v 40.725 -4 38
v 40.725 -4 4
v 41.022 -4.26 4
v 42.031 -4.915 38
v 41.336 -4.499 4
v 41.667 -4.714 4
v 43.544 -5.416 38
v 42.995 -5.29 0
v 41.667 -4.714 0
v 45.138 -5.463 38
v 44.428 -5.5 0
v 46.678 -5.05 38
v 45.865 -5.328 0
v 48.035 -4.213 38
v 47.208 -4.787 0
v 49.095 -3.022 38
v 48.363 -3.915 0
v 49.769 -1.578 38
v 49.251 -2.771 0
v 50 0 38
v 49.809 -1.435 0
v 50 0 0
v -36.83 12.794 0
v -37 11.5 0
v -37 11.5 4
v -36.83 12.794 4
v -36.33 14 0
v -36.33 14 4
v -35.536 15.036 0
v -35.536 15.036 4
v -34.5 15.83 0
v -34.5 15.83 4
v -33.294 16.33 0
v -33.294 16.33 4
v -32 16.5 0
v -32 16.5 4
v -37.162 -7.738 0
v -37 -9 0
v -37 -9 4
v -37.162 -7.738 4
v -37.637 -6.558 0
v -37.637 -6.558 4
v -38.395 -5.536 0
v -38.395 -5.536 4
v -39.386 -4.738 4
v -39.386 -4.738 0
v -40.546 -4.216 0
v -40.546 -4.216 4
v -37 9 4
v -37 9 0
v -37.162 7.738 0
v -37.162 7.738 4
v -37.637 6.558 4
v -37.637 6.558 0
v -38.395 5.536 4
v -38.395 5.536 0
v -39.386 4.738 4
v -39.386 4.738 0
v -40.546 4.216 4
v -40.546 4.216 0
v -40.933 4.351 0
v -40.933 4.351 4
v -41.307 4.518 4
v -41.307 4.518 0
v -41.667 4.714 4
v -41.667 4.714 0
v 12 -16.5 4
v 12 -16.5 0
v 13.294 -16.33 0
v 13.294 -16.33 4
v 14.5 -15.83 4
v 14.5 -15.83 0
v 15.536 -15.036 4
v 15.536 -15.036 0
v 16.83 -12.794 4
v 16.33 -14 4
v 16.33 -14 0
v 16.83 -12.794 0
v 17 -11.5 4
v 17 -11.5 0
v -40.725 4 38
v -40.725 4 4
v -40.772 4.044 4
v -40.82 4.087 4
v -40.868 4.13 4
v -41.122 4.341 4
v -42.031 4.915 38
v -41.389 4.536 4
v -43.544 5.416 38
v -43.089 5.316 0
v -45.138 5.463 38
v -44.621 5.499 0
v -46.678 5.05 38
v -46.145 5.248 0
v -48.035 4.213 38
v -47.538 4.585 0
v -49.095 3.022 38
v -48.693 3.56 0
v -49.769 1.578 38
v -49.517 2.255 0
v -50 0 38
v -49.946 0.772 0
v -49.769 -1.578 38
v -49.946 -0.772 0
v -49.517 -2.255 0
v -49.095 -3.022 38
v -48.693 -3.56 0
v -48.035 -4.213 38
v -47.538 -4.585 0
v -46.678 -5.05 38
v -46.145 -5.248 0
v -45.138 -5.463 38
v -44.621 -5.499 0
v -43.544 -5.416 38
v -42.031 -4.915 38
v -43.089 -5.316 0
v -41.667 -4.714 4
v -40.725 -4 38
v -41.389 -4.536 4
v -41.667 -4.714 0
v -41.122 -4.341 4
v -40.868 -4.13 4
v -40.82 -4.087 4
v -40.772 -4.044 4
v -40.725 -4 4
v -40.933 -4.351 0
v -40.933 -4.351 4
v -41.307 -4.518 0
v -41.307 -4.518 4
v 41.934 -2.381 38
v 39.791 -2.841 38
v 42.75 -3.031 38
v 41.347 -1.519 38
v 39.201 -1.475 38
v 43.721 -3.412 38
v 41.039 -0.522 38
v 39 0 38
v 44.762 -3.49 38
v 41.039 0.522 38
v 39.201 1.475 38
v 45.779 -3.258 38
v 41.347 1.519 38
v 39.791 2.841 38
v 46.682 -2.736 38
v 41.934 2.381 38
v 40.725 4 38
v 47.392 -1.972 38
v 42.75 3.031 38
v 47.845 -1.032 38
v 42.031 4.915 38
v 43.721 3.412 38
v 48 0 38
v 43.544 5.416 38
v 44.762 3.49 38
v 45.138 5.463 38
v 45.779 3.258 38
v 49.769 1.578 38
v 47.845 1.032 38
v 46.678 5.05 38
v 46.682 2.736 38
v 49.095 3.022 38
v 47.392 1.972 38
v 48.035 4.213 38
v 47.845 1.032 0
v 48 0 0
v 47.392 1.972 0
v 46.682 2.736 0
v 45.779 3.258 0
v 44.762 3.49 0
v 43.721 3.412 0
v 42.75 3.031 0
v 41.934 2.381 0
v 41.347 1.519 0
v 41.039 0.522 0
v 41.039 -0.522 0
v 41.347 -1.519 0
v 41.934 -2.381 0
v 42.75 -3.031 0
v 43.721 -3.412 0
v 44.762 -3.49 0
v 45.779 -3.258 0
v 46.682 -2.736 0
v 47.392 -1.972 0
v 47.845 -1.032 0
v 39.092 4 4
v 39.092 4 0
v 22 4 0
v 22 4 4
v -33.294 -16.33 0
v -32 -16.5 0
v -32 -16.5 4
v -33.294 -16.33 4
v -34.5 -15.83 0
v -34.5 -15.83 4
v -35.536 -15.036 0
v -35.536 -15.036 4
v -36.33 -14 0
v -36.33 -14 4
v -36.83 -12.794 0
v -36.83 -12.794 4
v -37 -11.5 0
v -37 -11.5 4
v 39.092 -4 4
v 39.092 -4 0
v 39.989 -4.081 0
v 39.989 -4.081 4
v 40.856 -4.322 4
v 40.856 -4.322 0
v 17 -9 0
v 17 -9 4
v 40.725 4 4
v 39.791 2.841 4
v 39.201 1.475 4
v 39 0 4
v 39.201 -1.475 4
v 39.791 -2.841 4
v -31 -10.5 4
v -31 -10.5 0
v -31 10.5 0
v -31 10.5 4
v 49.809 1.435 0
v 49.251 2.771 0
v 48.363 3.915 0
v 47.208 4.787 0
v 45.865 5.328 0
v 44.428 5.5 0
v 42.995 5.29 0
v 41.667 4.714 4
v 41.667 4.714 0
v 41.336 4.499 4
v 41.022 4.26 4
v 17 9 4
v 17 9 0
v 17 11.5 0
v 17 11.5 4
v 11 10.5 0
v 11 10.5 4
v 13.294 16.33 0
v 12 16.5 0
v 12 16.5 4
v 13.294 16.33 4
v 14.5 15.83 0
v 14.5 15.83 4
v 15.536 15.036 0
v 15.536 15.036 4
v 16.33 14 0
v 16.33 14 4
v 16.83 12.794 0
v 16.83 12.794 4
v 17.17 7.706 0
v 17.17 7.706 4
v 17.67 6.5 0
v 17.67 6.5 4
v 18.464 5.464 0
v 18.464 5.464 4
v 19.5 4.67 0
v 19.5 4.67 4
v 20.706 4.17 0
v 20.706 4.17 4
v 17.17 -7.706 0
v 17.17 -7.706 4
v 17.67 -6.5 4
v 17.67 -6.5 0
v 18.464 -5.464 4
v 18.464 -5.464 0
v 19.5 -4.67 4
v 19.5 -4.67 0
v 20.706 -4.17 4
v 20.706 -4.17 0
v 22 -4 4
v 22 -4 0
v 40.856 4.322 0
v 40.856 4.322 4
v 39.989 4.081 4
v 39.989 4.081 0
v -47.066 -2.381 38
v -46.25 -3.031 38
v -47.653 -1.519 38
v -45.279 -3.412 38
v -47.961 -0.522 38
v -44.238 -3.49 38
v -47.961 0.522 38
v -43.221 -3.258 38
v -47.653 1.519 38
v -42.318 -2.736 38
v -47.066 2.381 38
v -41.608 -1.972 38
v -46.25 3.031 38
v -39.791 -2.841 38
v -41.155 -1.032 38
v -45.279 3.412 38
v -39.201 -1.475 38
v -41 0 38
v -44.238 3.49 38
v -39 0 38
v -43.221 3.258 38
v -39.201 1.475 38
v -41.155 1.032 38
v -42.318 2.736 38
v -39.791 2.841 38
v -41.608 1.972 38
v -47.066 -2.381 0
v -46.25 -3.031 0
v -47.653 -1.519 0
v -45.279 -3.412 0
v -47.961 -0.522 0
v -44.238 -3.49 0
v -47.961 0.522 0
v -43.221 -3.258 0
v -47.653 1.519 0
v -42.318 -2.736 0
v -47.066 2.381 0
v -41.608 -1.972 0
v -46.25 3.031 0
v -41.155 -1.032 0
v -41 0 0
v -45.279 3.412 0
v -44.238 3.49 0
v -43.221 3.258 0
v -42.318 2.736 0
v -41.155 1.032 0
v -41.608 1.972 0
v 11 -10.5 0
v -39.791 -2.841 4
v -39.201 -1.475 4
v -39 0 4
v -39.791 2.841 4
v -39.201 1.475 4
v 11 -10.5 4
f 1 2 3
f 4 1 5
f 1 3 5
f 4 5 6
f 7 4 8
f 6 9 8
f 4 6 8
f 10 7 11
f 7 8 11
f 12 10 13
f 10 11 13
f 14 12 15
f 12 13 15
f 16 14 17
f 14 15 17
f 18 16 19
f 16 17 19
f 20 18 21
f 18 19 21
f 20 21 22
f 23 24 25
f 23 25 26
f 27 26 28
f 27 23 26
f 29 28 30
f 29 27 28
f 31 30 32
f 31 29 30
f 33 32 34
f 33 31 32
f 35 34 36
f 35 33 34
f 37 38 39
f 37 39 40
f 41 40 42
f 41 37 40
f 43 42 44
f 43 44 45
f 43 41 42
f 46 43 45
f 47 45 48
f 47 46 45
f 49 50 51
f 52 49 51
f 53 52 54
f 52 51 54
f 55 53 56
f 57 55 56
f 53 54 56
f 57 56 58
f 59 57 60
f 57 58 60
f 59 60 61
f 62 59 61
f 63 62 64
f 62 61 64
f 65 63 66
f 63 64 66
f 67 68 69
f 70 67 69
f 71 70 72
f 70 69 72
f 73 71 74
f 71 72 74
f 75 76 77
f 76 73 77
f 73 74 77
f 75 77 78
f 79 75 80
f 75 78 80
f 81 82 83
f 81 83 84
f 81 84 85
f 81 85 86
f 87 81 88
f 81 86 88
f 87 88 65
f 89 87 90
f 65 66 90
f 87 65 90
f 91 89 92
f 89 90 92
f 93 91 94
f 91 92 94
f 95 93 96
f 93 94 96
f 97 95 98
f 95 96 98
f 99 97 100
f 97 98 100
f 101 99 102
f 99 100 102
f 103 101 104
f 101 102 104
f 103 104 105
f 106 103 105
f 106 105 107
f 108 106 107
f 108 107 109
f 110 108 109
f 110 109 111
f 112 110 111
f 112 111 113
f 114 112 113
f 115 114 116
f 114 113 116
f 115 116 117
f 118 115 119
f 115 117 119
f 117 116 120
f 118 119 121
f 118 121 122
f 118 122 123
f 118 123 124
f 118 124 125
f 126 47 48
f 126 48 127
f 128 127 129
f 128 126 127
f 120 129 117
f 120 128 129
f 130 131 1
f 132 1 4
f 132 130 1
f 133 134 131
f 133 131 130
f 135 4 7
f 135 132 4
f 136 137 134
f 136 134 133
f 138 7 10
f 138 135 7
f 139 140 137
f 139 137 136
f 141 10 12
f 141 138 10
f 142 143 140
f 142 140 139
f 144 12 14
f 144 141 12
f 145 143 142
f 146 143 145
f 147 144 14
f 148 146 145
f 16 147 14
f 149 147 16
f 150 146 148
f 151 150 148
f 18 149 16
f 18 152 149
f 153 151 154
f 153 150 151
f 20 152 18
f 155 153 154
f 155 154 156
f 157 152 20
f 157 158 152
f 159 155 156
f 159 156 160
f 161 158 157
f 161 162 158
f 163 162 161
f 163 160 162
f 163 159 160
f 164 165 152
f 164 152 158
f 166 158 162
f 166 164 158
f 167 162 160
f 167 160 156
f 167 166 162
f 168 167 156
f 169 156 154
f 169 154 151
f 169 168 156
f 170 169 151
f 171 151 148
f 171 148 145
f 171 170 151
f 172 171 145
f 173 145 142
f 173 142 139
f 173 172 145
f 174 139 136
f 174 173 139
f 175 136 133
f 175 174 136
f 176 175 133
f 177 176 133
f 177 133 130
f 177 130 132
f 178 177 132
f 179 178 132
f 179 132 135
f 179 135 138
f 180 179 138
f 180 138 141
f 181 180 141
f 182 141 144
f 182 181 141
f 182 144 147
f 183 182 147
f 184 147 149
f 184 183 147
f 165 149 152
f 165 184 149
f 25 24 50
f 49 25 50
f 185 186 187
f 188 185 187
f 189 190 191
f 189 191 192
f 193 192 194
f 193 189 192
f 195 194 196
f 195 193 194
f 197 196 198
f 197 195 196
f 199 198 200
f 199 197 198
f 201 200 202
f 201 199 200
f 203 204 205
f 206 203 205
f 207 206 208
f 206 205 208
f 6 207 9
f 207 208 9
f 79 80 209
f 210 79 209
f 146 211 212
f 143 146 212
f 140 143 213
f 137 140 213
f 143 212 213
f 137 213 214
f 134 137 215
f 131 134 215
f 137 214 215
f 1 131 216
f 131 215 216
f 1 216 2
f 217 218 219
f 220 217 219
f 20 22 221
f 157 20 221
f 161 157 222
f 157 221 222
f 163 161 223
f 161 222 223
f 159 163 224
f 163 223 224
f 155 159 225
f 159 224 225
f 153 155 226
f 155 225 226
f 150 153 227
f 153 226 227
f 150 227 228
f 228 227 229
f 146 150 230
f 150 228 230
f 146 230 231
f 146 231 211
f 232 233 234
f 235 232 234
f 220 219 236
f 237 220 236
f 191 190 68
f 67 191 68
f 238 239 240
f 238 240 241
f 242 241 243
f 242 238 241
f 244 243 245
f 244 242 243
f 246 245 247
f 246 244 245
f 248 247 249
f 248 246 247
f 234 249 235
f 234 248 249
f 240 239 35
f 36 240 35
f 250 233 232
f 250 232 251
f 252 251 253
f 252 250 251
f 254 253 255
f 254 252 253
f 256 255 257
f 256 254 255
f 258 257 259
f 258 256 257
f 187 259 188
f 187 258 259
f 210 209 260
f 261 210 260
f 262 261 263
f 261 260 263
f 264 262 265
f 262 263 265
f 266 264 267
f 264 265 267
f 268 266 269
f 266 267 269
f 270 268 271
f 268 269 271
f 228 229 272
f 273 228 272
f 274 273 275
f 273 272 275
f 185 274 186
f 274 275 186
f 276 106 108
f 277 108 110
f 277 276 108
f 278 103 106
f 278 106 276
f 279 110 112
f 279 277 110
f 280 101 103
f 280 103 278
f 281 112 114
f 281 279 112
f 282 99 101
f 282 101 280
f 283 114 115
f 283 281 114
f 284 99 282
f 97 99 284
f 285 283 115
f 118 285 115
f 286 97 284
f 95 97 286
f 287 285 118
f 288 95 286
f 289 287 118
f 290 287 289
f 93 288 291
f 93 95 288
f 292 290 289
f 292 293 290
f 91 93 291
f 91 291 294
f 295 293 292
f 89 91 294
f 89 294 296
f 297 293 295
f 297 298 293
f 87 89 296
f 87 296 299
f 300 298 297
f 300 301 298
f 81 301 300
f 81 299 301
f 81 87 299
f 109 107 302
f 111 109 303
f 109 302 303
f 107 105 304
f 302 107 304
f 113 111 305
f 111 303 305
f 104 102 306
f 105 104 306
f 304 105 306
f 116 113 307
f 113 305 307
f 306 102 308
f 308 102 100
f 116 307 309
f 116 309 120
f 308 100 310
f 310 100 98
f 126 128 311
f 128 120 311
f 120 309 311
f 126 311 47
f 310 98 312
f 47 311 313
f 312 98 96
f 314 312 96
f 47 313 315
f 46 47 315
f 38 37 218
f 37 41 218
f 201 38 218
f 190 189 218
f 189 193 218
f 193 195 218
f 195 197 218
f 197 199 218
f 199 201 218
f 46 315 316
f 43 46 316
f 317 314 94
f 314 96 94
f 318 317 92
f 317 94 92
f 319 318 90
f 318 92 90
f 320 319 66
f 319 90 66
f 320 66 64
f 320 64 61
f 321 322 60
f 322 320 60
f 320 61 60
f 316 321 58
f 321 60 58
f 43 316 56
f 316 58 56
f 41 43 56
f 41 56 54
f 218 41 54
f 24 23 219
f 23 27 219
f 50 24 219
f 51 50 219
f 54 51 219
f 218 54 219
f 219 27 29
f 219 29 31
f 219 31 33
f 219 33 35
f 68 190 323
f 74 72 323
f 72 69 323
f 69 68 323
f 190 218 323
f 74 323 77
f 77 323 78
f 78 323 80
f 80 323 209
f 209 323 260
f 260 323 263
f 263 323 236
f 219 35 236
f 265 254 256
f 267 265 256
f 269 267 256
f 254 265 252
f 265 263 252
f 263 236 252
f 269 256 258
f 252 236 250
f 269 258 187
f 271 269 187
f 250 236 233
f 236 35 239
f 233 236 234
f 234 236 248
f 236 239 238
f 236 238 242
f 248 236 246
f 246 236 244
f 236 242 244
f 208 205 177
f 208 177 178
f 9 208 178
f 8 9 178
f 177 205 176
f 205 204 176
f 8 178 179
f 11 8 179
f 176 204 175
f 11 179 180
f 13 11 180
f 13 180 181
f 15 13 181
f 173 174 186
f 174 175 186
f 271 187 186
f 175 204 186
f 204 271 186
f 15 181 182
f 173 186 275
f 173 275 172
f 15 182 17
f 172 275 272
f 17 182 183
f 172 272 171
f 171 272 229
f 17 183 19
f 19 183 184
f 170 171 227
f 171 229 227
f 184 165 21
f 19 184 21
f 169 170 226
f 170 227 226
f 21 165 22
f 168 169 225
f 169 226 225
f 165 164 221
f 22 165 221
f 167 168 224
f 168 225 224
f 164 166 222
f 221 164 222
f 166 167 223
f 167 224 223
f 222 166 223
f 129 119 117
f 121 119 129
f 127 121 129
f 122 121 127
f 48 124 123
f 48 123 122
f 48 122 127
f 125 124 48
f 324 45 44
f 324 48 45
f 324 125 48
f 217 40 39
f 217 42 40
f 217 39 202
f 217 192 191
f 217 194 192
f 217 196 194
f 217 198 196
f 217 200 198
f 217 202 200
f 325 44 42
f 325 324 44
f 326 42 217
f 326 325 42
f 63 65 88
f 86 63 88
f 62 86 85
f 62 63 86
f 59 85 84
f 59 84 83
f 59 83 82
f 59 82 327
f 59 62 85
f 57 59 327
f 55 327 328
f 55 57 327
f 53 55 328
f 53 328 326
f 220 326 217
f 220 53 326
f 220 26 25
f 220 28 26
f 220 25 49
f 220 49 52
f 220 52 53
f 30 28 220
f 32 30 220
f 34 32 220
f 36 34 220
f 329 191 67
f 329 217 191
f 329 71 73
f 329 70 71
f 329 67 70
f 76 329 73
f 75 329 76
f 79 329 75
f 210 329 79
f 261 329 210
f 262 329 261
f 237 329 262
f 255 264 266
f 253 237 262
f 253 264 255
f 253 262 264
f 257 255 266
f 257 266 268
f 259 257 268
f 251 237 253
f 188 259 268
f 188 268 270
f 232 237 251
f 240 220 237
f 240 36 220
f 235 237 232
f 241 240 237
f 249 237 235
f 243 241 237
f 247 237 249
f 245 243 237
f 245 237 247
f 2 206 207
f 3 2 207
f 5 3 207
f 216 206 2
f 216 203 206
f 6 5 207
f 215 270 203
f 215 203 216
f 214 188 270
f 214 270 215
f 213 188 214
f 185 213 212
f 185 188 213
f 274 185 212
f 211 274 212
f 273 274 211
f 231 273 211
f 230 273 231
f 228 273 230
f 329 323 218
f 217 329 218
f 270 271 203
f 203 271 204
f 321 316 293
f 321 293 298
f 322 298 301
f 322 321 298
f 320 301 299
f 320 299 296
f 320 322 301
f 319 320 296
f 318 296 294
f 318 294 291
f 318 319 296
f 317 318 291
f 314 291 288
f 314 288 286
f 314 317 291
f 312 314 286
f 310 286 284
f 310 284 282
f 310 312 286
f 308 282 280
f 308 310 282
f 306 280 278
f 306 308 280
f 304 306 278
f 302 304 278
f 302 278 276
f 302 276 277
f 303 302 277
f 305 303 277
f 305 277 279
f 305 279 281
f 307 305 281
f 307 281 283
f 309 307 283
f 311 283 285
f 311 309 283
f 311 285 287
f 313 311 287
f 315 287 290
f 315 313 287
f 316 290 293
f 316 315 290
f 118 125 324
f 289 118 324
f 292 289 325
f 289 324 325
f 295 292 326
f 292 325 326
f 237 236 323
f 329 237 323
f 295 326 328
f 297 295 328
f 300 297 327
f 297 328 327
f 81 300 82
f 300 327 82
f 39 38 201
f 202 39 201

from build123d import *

# Parameters (mm, degrees)
F1_DEPTH    = 4
F0_R        = 3.5
F2_DEPTH    = 38
F0_W        = 6
F0_H        = 8
F3_DEPTH    = 4
F4_T1_DEPTH = 4
F4_T3_DEPTH = 29


# Not quite as in the source:
# - a fillet or chamfer that OpenCascade refuses, or shapes differently, is made with other operations: its cross-section is extruded or revolved along the edge and cut away or added


with BuildPart() as f1:
    # F0 (on Top) → F1 (new body)
    with BuildSketch(Plane.XY):
        with BuildLine():
            ThreePointArc((-40.7250827824, 4), (-39.4496512647, 2.1780674121), (-39, 0))
            ThreePointArc((-39, 0), (-39.4496512647, -2.1780674121), (-40.7250827824, -4))
            Line((-40.7250827824, -4), (-37, -4))
            Line((-37, -4), (-37, 4))
            Line((-37, 4), (-40.7250827824, 4))
        make_face()
    extrude(amount=F1_DEPTH)

    # F0 (on Top) → F2 (join)
    with BuildSketch(Plane.XY):
        with BuildLine():
            ThreePointArc((-40.7250827824, -4), (-39.4496512647, -2.1780674121), (-39, 0))
            ThreePointArc((-39, 0), (-39.4496512647, 2.1780674121), (-40.7250827824, 4))
            ThreePointArc((-40.7250827824, 4), (-50, 0), (-40.7250827824, -4))
        make_face()
        with Locations((-44.5, 0)):
            Circle(F0_R, mode=Mode.SUBTRACT)
    extrude(amount=F2_DEPTH)



with BuildPart() as f1b:
    # F0 (on Top) → F1, piece 2 (new body)
    with BuildSketch(Plane.XY):
        with BuildLine():
            Line((40.7250827824, 4), (17, 4))
            Line((17, 4), (17, -4))
            Line((17, -4), (40.7250827824, -4))
            ThreePointArc((40.7250827824, -4), (39, 0), (40.7250827824, 4))
        make_face()
    extrude(amount=F1_DEPTH)

    # F0 (on Top) → F2, piece 2 (join)
    with BuildSketch(Plane.XY):
        with BuildLine():
            ThreePointArc((50, 0), (46.6780674121, 5.0503487353), (40.7250827824, 4))
            ThreePointArc((40.7250827824, 4), (39, 0), (40.7250827824, -4))
            ThreePointArc((40.7250827824, -4), (46.6780674121, -5.0503487353), (50, 0))
        make_face()
        with Locations((44.5, 0)):
            Circle(F0_R, mode=Mode.SUBTRACT)
    extrude(amount=F2_DEPTH)


with BuildPart() as f1_1:
    add(f1.part)

    add(f1b.part)  # F3 merges F1b
    # F0 (on Top) → F3 (join)
    with BuildSketch(Plane.XY):
        Polygon((-31, -4), (-37, -4), (-37, -16.5), (17, -16.5), (17, -4), (11, -4), (11, -10.5), (-31, -10.5), align=None)
        Polygon((-37, 16.5), (-37, 4), (-31, 4), (-31, 10.5), (11, 10.5), (11, 4), (17, 4), (17, 16.5), align=None)
        with Locations((-34, 0)):
            Rectangle(F0_W, F0_H)
        with Locations((14, 0)):
            Rectangle(F0_W, F0_H)
    extrude(amount=F3_DEPTH)

    # F4: fillet of radius 5 on 12 edges, made by hand

    # F4_s2 → F4_t1 (join)
    with BuildSketch(Plane.XY):
        with BuildLine():
            ThreePointArc((-39.0916730868, 4), (-40.4279792964, 4.1818794417), (-41.667066855, 4.7142857143))
            ThreePointArc((-41.667066855, 4.7142857143), (-41.1768279274, 4.3825252282), (-40.7250827824, 4))
            Line((-40.7250827824, 4), (-39.0916730868, 4))
        make_face()
        with BuildLine():
            ThreePointArc((-37, 9), (-38.4644660941, 5.4644660941), (-42, 4))
            Line((-42, 4), (-37, 4))
            Line((-37, 4), (-37, 9))
        make_face()
        with BuildLine():
            ThreePointArc((-37, -9), (-38.4644660941, -5.4644660941), (-42, -4))
            Line((-42, -4), (-37, -4))
            Line((-37, -4), (-37, -9))
        make_face()
        with BuildLine():
            ThreePointArc((-39.0916730868, -4), (-40.4279792964, -4.1818794417), (-41.667066855, -4.7142857143))
            ThreePointArc((-41.667066855, -4.7142857143), (-41.1768279274, -4.3825252282), (-40.7250827824, -4))
            Line((-40.7250827824, -4), (-39.0916730868, -4))
        make_face()
        with BuildLine():
            ThreePointArc((17, 9), (18.4644660941, 5.4644660941), (22, 4))
            Line((22, 4), (17, 4))
            Line((17, 4), (17, 9))
        make_face()
        with BuildLine():
            ThreePointArc((17, -9), (18.4644660941, -5.4644660941), (22, -4))
            Line((22, -4), (17, -4))
            Line((17, -4), (17, -9))
        make_face()
        with BuildLine():
            ThreePointArc((39.0916730868, -4), (40.4279792964, -4.1818794417), (41.667066855, -4.7142857143))
            ThreePointArc((41.667066855, -4.7142857143), (41.1768279274, -4.3825252282), (40.7250827824, -4))
            Line((40.7250827824, -4), (39.0916730868, -4))
        make_face()
        with BuildLine():
            ThreePointArc((41.667066855, 4.7142857143), (40.4279792964, 4.1818794417), (39.0916730868, 4))
            Line((39.0916730868, 4), (40.7250827824, 4))
            ThreePointArc((40.7250827824, 4), (41.1768279274, 4.3825252282), (41.667066855, 4.7142857143))
        make_face()
    extrude(amount=F4_T1_DEPTH)

    # F4_s4 → F4_t3 (cut)
    with BuildSketch(Plane.XY.offset(-12.5)):
        with BuildLine():
            ThreePointArc((12, 16.5), (15.5355339059, 15.0355339059), (17, 11.5))
            Line((17, 11.5), (17, 16.5))
            Line((17, 16.5), (12, 16.5))
        make_face()
        with BuildLine():
            ThreePointArc((-37, 11.5), (-35.5355339059, 15.0355339059), (-32, 16.5))
            Line((-32, 16.5), (-37, 16.5))
            Line((-37, 16.5), (-37, 11.5))
        make_face()
        with BuildLine():
            ThreePointArc((-32, -16.5), (-35.5355339059, -15.0355339059), (-37, -11.5))
            Line((-37, -11.5), (-37, -16.5))
            Line((-37, -16.5), (-32, -16.5))
        make_face()
        with BuildLine():
            ThreePointArc((12, -16.5), (15.5355339059, -15.0355339059), (17, -11.5))
            Line((17, -11.5), (17, -16.5))
            Line((17, -16.5), (12, -16.5))
        make_face()
    extrude(amount=F4_T3_DEPTH, mode=Mode.SUBTRACT)


solid = f1_1.part
